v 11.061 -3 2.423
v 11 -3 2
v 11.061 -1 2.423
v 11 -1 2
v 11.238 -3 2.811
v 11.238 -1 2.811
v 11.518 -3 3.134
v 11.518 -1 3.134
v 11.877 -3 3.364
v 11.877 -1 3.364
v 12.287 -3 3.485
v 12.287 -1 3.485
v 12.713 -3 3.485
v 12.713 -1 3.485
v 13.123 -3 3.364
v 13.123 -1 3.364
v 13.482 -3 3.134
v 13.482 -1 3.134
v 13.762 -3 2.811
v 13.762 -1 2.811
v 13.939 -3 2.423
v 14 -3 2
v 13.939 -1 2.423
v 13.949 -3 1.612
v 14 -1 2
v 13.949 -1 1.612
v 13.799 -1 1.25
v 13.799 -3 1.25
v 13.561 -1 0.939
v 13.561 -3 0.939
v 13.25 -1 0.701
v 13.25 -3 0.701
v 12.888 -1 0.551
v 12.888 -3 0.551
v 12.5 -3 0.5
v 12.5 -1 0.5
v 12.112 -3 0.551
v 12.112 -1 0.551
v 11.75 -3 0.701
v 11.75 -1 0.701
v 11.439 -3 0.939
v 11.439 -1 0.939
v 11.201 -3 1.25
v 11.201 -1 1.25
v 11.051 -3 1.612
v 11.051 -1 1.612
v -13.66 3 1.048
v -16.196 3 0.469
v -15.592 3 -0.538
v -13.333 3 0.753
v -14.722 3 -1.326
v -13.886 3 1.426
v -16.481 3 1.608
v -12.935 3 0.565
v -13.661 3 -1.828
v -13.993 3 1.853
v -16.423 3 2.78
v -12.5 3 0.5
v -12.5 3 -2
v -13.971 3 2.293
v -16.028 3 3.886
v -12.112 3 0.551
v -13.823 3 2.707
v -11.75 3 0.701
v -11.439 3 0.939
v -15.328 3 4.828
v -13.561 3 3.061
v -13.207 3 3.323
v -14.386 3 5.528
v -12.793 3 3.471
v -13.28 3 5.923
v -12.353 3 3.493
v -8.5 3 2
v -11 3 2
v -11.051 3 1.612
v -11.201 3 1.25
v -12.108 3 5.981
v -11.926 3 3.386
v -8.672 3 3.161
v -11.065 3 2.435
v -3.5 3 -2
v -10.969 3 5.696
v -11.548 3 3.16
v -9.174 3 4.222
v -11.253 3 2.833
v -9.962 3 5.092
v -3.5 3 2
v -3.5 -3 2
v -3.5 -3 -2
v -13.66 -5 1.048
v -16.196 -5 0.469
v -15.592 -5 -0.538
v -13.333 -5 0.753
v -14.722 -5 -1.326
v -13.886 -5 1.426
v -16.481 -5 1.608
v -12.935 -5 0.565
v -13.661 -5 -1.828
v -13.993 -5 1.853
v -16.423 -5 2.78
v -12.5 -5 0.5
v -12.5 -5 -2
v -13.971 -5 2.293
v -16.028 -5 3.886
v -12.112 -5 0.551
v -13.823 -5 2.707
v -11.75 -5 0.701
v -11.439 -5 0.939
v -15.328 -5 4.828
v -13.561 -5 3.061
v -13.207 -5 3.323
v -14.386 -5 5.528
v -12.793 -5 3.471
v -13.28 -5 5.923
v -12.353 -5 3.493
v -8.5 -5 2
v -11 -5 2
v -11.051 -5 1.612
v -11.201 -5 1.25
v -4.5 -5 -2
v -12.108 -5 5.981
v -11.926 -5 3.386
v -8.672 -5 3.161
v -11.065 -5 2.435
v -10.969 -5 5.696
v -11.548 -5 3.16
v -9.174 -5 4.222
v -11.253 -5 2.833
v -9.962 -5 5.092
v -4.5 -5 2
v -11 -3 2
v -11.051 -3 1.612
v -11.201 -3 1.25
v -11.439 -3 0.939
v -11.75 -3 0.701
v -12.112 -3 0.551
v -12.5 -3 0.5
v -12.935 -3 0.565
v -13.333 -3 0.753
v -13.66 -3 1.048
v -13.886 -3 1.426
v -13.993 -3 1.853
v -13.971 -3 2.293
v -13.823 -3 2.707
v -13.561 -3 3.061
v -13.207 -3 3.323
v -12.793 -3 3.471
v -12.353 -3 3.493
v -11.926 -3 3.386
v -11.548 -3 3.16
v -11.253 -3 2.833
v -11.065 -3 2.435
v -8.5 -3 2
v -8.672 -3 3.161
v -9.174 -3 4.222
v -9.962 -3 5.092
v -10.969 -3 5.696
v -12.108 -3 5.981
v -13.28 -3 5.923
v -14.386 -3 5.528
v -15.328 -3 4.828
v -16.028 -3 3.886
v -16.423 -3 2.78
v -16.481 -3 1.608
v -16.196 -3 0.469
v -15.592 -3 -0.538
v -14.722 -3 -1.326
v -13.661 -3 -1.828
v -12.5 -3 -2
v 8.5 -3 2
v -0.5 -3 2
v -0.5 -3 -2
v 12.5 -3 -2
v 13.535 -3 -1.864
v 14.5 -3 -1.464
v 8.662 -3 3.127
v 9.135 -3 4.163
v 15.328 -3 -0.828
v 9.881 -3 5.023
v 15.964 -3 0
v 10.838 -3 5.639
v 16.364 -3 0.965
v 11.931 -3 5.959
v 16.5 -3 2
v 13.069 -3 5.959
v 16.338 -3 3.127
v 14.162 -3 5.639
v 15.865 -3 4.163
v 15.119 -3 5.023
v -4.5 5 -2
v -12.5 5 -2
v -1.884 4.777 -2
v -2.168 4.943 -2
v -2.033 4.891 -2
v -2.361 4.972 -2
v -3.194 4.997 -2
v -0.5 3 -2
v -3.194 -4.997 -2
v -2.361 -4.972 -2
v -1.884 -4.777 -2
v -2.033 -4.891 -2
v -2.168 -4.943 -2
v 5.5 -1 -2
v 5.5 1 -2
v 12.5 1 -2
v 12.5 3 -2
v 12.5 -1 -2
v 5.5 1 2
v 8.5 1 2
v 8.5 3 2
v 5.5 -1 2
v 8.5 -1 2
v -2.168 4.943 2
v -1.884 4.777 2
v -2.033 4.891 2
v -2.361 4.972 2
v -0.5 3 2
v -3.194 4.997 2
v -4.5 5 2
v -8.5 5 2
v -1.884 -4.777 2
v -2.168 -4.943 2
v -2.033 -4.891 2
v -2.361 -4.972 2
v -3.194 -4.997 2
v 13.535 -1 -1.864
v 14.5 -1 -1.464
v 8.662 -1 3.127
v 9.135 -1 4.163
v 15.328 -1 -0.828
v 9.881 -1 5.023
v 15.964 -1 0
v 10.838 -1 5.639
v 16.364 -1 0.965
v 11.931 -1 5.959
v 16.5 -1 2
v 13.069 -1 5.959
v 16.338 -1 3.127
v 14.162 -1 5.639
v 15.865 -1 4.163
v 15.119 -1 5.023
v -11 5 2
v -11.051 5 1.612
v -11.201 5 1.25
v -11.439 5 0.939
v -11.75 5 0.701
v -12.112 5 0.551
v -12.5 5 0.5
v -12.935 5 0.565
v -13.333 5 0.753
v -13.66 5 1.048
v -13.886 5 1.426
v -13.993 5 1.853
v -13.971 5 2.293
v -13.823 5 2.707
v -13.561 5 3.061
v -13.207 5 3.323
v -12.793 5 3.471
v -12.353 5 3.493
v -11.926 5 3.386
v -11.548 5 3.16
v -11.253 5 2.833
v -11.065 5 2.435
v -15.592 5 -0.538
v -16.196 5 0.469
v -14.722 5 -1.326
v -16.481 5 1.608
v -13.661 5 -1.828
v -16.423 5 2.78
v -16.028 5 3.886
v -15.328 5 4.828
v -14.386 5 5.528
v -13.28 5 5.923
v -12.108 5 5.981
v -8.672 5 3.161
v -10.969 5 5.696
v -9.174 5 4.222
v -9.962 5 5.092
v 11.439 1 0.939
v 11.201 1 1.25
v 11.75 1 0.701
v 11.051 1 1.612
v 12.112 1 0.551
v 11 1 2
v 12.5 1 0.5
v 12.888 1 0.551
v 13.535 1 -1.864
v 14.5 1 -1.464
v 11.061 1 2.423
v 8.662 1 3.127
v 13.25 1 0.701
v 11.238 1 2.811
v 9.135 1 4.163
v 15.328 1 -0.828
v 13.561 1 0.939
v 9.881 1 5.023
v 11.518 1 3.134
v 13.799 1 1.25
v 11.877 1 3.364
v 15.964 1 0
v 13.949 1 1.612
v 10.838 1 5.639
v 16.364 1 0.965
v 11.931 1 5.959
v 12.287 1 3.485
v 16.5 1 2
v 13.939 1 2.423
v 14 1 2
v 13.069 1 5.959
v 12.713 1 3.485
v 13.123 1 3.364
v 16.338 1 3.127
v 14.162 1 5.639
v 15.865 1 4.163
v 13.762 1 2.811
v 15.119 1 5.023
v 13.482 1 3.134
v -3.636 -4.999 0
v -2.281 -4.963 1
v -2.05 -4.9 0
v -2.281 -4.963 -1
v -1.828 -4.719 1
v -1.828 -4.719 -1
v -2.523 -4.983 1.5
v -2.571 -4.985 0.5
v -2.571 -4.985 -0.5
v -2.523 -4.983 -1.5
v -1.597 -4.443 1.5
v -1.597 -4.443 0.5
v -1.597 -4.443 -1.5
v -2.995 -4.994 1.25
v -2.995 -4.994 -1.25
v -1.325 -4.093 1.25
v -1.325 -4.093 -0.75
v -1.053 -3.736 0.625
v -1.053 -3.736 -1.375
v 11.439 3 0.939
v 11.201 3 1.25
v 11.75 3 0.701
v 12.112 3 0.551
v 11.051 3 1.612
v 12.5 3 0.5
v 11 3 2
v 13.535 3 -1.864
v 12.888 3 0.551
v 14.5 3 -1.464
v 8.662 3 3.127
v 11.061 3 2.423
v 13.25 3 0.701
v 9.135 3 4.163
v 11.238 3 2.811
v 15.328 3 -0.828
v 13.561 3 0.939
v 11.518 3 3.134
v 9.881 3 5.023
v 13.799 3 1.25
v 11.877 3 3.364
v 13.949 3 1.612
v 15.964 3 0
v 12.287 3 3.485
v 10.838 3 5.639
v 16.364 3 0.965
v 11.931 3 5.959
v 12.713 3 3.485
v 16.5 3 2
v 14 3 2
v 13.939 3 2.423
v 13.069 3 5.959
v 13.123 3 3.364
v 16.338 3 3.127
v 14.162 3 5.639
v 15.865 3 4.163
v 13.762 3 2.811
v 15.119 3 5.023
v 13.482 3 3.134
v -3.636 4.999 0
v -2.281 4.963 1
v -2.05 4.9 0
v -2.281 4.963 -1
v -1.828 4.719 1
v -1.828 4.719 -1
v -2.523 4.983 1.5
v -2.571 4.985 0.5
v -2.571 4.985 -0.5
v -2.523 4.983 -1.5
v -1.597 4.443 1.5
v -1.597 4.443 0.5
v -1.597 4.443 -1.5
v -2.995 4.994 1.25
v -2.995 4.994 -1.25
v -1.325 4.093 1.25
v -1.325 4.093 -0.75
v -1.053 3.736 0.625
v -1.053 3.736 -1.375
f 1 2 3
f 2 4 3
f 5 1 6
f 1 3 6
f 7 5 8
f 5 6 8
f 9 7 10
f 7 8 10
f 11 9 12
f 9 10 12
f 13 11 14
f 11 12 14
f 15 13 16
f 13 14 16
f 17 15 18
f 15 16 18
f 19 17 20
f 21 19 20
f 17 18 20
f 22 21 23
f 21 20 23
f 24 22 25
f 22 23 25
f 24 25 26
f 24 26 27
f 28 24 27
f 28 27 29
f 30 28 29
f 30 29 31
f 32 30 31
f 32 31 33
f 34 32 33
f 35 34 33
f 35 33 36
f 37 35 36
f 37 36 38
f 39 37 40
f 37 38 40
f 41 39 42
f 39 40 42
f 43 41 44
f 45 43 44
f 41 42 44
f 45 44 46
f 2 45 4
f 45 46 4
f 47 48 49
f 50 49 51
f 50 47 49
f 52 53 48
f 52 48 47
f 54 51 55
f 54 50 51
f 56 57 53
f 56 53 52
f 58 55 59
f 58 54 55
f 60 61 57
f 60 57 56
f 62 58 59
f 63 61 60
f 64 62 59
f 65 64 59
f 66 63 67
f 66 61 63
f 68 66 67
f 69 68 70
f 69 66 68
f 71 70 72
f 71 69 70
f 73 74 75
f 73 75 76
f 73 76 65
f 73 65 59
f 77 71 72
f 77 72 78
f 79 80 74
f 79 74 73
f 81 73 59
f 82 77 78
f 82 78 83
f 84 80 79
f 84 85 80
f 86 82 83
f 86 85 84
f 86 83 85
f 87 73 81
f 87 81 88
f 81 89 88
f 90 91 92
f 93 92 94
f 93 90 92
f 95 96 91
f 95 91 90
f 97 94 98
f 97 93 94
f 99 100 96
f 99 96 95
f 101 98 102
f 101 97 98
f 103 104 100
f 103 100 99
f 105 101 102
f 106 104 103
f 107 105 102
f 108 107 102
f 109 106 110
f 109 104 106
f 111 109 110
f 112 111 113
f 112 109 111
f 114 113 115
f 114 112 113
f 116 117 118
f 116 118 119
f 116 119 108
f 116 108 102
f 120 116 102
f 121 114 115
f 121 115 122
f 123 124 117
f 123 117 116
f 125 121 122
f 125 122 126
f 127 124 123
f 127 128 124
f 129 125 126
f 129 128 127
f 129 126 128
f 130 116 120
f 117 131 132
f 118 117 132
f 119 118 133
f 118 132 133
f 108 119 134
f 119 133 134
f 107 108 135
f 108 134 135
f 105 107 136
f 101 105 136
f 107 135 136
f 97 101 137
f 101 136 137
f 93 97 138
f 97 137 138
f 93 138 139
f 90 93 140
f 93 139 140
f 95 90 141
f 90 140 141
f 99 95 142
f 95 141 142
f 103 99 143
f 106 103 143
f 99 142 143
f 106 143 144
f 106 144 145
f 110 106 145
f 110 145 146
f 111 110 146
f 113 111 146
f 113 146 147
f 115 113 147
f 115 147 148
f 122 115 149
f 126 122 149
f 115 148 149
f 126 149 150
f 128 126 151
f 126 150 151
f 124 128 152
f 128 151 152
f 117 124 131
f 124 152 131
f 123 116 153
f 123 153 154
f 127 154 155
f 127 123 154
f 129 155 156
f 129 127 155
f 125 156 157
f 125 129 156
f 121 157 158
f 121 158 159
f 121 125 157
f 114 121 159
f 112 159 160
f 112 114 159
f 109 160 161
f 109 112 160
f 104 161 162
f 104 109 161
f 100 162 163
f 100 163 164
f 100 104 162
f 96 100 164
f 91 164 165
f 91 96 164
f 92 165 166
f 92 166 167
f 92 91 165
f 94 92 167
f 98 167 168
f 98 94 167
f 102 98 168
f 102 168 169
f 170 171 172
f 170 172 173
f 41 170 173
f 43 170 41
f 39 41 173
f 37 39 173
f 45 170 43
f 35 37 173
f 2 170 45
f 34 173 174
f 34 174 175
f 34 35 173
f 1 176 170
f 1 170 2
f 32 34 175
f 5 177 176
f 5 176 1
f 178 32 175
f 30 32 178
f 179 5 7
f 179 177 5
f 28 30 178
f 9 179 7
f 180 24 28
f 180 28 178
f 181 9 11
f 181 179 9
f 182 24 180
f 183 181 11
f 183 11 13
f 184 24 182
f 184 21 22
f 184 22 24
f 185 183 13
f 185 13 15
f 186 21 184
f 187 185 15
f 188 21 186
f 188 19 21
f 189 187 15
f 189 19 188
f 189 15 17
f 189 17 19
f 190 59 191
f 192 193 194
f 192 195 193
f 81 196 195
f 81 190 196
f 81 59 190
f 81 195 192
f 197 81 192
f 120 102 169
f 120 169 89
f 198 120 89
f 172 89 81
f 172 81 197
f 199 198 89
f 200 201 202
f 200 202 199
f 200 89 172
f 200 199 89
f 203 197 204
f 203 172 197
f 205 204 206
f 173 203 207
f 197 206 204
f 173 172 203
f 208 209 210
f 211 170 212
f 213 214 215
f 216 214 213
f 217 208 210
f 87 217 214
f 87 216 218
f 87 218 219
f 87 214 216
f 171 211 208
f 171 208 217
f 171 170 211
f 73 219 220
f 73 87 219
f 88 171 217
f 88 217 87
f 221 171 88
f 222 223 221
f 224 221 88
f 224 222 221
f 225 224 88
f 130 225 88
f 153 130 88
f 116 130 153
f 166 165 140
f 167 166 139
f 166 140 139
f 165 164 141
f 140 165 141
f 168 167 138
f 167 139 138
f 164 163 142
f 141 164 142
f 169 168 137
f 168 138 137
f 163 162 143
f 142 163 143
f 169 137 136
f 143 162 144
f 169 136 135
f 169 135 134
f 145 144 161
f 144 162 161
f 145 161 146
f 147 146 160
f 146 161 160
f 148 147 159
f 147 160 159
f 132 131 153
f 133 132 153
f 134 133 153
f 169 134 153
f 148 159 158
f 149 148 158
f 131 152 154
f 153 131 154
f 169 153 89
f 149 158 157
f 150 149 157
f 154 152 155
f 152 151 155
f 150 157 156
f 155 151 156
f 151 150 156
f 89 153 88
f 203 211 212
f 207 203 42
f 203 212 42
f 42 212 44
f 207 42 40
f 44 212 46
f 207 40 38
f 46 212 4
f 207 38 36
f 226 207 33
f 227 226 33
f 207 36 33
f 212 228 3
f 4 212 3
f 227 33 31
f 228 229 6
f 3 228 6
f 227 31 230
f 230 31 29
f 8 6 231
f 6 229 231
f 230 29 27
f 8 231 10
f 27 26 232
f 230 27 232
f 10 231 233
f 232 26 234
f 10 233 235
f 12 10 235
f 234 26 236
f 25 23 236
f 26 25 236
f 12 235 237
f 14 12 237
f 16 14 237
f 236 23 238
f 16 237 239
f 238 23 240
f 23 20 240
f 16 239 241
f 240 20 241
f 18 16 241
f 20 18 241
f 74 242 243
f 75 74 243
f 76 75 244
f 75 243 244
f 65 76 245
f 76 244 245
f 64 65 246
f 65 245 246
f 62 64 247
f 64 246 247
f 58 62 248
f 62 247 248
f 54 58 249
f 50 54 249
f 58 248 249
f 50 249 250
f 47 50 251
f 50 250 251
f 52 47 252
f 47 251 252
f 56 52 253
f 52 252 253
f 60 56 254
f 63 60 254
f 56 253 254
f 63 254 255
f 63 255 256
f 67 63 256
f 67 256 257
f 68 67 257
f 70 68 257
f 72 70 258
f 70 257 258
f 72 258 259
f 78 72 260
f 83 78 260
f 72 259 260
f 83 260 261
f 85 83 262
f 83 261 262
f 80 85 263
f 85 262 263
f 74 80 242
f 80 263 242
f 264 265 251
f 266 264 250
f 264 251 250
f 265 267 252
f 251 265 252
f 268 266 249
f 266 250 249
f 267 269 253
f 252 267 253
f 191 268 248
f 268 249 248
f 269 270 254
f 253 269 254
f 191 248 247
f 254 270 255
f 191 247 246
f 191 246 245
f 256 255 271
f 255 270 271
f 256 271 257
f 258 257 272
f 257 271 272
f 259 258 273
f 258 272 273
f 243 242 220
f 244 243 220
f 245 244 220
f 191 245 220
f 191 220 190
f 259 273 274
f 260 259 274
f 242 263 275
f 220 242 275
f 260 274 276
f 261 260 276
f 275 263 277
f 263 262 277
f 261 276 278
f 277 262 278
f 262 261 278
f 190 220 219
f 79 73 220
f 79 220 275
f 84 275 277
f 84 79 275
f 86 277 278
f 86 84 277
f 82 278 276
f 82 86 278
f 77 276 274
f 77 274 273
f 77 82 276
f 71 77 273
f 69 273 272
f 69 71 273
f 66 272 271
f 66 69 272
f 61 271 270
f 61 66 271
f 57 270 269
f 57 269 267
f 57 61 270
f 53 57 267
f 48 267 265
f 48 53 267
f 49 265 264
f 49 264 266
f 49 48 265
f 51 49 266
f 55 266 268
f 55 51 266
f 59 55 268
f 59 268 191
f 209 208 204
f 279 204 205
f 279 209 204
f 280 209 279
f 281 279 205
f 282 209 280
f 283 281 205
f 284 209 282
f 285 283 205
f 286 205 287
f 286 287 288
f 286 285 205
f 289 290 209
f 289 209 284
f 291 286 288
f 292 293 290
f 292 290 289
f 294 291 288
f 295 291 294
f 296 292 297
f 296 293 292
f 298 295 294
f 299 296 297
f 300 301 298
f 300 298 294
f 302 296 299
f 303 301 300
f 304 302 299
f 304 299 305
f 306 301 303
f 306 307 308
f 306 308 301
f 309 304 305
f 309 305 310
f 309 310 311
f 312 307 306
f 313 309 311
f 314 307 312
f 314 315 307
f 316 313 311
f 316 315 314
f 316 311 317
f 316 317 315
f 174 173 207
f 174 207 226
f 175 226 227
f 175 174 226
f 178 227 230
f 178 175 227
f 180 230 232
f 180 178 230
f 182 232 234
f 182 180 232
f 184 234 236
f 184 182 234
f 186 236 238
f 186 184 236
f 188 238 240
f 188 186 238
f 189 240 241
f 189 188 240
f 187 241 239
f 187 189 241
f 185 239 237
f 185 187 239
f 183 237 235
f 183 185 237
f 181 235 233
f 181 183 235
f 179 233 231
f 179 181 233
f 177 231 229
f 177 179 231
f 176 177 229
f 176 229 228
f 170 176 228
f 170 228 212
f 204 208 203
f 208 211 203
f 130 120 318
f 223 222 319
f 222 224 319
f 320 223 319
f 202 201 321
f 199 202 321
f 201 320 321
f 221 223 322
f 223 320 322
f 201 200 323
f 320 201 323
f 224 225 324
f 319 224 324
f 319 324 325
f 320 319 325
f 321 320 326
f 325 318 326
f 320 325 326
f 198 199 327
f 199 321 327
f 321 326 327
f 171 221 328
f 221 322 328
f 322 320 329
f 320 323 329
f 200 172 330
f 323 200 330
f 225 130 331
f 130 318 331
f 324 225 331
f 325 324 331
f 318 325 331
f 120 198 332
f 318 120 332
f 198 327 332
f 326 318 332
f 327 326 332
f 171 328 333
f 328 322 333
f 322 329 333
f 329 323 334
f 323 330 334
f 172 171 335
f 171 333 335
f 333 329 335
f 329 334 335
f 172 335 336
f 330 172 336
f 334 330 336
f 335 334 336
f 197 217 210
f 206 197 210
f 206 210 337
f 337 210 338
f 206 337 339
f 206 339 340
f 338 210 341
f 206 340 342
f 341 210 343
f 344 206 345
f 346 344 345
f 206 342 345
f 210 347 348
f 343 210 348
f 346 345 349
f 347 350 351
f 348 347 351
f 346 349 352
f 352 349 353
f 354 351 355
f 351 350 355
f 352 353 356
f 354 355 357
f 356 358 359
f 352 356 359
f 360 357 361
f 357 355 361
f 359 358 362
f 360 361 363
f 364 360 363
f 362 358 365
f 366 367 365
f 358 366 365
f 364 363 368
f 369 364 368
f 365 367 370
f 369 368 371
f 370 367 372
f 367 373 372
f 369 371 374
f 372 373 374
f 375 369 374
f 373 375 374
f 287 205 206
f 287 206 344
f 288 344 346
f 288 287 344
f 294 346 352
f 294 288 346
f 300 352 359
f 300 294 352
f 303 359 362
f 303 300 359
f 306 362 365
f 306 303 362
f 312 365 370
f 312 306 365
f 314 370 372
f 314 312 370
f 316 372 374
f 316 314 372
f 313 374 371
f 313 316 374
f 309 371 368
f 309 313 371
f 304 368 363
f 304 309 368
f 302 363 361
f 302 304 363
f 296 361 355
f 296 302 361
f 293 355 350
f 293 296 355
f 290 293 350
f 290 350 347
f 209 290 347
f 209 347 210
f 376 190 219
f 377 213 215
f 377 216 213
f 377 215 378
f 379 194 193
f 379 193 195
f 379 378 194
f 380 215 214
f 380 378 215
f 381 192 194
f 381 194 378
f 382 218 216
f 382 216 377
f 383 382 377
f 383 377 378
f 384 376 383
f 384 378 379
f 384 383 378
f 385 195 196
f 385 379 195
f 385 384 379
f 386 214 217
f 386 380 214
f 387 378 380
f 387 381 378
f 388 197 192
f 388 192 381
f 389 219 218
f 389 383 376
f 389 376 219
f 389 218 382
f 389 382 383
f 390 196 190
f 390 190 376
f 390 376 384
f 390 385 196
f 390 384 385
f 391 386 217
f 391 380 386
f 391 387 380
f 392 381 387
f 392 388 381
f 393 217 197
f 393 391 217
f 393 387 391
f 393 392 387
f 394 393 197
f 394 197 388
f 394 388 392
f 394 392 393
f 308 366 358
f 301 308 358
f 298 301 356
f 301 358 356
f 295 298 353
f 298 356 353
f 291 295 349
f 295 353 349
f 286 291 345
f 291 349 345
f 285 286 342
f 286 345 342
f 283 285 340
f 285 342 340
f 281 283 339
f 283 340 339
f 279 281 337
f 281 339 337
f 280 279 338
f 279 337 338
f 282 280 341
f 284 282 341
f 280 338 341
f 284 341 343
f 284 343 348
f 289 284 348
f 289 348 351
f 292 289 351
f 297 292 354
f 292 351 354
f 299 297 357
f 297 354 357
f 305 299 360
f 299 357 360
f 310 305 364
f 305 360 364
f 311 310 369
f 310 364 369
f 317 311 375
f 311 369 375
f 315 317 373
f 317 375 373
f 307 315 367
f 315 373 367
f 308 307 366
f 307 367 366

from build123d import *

# Parameters (mm, degrees)
F0_W        = 3
F0_H        = 4
F1_DEPTH    = 5
F0_W_2      = 6
F2_DEPTH    = 3
F3_DEPTH    = 3
F4_DEPTH    = 1
F5_T1_DEPTH = 24


# Not quite as in the source:
# - a fillet or chamfer that OpenCascade refuses, or shapes differently, is made with other operations: its cross-section is extruded or revolved along the edge and cut away or added


with BuildPart() as f1:
    # F0 (on Front) → F1 (new body, symmetric)
    with BuildSketch(Plane.XZ):
        with BuildLine():
            Line((-11, 2), (-8.5, 2))
            ThreePointArc((-8.5, 2), (-15.3284271247, 4.8284271247), (-12.5, -2))
            Line((-12.5, -2), (-12.5, 0.5))
            ThreePointArc((-12.5, 0.5), (-13.5606601718, 3.0606601718), (-11, 2))
        make_face()
        with BuildLine():
            ThreePointArc((-12.5, -2), (-9.6715728753, -0.8284271247), (-8.5, 2))
            Line((-8.5, 2), (-11, 2))
            ThreePointArc((-11, 2), (-11.4393398282, 0.9393398282), (-12.5, 0.5))
            Line((-12.5, 0.5), (-12.5, -2))
        make_face()
        with BuildLine():
            Line((-3.5, -2), (-3.5, 2))
            Line((-3.5, 2), (-8.5, 2))
            ThreePointArc((-8.5, 2), (-9.6715728753, -0.8284271247), (-12.5, -2))
            Line((-12.5, -2), (-3.5, -2))
        make_face()
        with Locations((-2, 0)):
            Rectangle(F0_W, F0_H)
    extrude(amount=F1_DEPTH, both=True)

    # F0 (on Front) → F2 (join, symmetric)
    with BuildSketch(Plane.XZ):
        with Locations((2.5, 0)):
            Rectangle(F0_W_2, F0_H)
        with BuildLine():
            Line((8.5, 2), (5.5, 2))
            Line((5.5, 2), (5.5, -2))
            Line((5.5, -2), (12.5, -2))
            ThreePointArc((12.5, -2), (9.6715728753, -0.8284271247), (8.5, 2))
        make_face()
        with BuildLine():
            Line((11, 2), (8.5, 2))
            ThreePointArc((8.5, 2), (9.6715728753, -0.8284271247), (12.5, -2))
            Line((12.5, -2), (12.5, 0.5))
            ThreePointArc((12.5, 0.5), (11.4393398282, 0.9393398282), (11, 2))
        make_face()
        with BuildLine():
            ThreePointArc((16.5, 2), (12.5, 6), (8.5, 2))
            Line((8.5, 2), (11, 2))
            ThreePointArc((11, 2), (12.5, 3.5), (14, 2))
            ThreePointArc((14, 2), (13.5606601718, 0.9393398282), (12.5, 0.5))
            Line((12.5, 0.5), (12.5, -2))
            ThreePointArc((12.5, -2), (15.3284271247, -0.8284271247), (16.5, 2))
        make_face()
    extrude(amount=F2_DEPTH, both=True)

    # F0 (on Front) → F3 (cut, symmetric)
    with BuildSketch(Plane.XZ):
        with BuildLine():
            Line((-3.5, -2), (-3.5, 2))
            Line((-3.5, 2), (-8.5, 2))
            ThreePointArc((-8.5, 2), (-9.6715728753, -0.8284271247), (-12.5, -2))
            Line((-12.5, -2), (-3.5, -2))
        make_face()
        with BuildLine():
            ThreePointArc((-12.5, -2), (-9.6715728753, -0.8284271247), (-8.5, 2))
            Line((-8.5, 2), (-11, 2))
            ThreePointArc((-11, 2), (-11.4393398282, 0.9393398282), (-12.5, 0.5))
            Line((-12.5, 0.5), (-12.5, -2))
        make_face()
        with BuildLine():
            Line((-11, 2), (-8.5, 2))
            ThreePointArc((-8.5, 2), (-15.3284271247, 4.8284271247), (-12.5, -2))
            Line((-12.5, -2), (-12.5, 0.5))
            ThreePointArc((-12.5, 0.5), (-13.5606601718, 3.0606601718), (-11, 2))
        make_face()
    extrude(amount=F3_DEPTH, both=True, mode=Mode.SUBTRACT)

    # F0 (on Front) → F4 (cut, symmetric)
    with BuildSketch(Plane.XZ):
        with BuildLine():
            Line((8.5, 2), (5.5, 2))
            Line((5.5, 2), (5.5, -2))
            Line((5.5, -2), (12.5, -2))
            ThreePointArc((12.5, -2), (9.6715728753, -0.8284271247), (8.5, 2))
        make_face()
        with BuildLine():
            Line((11, 2), (8.5, 2))
            ThreePointArc((8.5, 2), (9.6715728753, -0.8284271247), (12.5, -2))
            Line((12.5, -2), (12.5, 0.5))
            ThreePointArc((12.5, 0.5), (11.4393398282, 0.9393398282), (11, 2))
        make_face()
        with BuildLine():
            ThreePointArc((16.5, 2), (12.5, 6), (8.5, 2))
            Line((8.5, 2), (11, 2))
            ThreePointArc((11, 2), (12.5, 3.5), (14, 2))
            ThreePointArc((14, 2), (13.5606601718, 0.9393398282), (12.5, 0.5))
            Line((12.5, 0.5), (12.5, -2))
            ThreePointArc((12.5, -2), (15.3284271247, -0.8284271247), (16.5, 2))
        make_face()
    extrude(amount=F4_DEPTH, both=True, mode=Mode.SUBTRACT)

    # F5: fillet of radius 5 on 2 edges, made by hand

    # F5_s2 → F5_t1 (cut)
    with BuildSketch(Plane.XY.offset(-12)):
        with BuildLine():
            add(Edge.make_bspline(
                [(-4.5, -5), (-2, -5), (-0.5, -3)],
                knots=[0, 0, 0, 1, 1, 1], degree=2, weights=[1, 9, 1]))
            Line((-0.5, -3), (-0.5, -5))
            Line((-0.5, -5), (-4.5, -5))
        make_face()
        with BuildLine():
            add(Edge.make_bspline(
                [(-4.5, 5), (-2, 5), (-0.5, 3)],
                knots=[0, 0, 0, 1, 1, 1], degree=2, weights=[1, 9, 1]))
            Line((-0.5, 3), (-0.5, 5))
            Line((-0.5, 5), (-4.5, 5))
        make_face()
    extrude(amount=F5_T1_DEPTH, mode=Mode.SUBTRACT)


solid = f1.part
